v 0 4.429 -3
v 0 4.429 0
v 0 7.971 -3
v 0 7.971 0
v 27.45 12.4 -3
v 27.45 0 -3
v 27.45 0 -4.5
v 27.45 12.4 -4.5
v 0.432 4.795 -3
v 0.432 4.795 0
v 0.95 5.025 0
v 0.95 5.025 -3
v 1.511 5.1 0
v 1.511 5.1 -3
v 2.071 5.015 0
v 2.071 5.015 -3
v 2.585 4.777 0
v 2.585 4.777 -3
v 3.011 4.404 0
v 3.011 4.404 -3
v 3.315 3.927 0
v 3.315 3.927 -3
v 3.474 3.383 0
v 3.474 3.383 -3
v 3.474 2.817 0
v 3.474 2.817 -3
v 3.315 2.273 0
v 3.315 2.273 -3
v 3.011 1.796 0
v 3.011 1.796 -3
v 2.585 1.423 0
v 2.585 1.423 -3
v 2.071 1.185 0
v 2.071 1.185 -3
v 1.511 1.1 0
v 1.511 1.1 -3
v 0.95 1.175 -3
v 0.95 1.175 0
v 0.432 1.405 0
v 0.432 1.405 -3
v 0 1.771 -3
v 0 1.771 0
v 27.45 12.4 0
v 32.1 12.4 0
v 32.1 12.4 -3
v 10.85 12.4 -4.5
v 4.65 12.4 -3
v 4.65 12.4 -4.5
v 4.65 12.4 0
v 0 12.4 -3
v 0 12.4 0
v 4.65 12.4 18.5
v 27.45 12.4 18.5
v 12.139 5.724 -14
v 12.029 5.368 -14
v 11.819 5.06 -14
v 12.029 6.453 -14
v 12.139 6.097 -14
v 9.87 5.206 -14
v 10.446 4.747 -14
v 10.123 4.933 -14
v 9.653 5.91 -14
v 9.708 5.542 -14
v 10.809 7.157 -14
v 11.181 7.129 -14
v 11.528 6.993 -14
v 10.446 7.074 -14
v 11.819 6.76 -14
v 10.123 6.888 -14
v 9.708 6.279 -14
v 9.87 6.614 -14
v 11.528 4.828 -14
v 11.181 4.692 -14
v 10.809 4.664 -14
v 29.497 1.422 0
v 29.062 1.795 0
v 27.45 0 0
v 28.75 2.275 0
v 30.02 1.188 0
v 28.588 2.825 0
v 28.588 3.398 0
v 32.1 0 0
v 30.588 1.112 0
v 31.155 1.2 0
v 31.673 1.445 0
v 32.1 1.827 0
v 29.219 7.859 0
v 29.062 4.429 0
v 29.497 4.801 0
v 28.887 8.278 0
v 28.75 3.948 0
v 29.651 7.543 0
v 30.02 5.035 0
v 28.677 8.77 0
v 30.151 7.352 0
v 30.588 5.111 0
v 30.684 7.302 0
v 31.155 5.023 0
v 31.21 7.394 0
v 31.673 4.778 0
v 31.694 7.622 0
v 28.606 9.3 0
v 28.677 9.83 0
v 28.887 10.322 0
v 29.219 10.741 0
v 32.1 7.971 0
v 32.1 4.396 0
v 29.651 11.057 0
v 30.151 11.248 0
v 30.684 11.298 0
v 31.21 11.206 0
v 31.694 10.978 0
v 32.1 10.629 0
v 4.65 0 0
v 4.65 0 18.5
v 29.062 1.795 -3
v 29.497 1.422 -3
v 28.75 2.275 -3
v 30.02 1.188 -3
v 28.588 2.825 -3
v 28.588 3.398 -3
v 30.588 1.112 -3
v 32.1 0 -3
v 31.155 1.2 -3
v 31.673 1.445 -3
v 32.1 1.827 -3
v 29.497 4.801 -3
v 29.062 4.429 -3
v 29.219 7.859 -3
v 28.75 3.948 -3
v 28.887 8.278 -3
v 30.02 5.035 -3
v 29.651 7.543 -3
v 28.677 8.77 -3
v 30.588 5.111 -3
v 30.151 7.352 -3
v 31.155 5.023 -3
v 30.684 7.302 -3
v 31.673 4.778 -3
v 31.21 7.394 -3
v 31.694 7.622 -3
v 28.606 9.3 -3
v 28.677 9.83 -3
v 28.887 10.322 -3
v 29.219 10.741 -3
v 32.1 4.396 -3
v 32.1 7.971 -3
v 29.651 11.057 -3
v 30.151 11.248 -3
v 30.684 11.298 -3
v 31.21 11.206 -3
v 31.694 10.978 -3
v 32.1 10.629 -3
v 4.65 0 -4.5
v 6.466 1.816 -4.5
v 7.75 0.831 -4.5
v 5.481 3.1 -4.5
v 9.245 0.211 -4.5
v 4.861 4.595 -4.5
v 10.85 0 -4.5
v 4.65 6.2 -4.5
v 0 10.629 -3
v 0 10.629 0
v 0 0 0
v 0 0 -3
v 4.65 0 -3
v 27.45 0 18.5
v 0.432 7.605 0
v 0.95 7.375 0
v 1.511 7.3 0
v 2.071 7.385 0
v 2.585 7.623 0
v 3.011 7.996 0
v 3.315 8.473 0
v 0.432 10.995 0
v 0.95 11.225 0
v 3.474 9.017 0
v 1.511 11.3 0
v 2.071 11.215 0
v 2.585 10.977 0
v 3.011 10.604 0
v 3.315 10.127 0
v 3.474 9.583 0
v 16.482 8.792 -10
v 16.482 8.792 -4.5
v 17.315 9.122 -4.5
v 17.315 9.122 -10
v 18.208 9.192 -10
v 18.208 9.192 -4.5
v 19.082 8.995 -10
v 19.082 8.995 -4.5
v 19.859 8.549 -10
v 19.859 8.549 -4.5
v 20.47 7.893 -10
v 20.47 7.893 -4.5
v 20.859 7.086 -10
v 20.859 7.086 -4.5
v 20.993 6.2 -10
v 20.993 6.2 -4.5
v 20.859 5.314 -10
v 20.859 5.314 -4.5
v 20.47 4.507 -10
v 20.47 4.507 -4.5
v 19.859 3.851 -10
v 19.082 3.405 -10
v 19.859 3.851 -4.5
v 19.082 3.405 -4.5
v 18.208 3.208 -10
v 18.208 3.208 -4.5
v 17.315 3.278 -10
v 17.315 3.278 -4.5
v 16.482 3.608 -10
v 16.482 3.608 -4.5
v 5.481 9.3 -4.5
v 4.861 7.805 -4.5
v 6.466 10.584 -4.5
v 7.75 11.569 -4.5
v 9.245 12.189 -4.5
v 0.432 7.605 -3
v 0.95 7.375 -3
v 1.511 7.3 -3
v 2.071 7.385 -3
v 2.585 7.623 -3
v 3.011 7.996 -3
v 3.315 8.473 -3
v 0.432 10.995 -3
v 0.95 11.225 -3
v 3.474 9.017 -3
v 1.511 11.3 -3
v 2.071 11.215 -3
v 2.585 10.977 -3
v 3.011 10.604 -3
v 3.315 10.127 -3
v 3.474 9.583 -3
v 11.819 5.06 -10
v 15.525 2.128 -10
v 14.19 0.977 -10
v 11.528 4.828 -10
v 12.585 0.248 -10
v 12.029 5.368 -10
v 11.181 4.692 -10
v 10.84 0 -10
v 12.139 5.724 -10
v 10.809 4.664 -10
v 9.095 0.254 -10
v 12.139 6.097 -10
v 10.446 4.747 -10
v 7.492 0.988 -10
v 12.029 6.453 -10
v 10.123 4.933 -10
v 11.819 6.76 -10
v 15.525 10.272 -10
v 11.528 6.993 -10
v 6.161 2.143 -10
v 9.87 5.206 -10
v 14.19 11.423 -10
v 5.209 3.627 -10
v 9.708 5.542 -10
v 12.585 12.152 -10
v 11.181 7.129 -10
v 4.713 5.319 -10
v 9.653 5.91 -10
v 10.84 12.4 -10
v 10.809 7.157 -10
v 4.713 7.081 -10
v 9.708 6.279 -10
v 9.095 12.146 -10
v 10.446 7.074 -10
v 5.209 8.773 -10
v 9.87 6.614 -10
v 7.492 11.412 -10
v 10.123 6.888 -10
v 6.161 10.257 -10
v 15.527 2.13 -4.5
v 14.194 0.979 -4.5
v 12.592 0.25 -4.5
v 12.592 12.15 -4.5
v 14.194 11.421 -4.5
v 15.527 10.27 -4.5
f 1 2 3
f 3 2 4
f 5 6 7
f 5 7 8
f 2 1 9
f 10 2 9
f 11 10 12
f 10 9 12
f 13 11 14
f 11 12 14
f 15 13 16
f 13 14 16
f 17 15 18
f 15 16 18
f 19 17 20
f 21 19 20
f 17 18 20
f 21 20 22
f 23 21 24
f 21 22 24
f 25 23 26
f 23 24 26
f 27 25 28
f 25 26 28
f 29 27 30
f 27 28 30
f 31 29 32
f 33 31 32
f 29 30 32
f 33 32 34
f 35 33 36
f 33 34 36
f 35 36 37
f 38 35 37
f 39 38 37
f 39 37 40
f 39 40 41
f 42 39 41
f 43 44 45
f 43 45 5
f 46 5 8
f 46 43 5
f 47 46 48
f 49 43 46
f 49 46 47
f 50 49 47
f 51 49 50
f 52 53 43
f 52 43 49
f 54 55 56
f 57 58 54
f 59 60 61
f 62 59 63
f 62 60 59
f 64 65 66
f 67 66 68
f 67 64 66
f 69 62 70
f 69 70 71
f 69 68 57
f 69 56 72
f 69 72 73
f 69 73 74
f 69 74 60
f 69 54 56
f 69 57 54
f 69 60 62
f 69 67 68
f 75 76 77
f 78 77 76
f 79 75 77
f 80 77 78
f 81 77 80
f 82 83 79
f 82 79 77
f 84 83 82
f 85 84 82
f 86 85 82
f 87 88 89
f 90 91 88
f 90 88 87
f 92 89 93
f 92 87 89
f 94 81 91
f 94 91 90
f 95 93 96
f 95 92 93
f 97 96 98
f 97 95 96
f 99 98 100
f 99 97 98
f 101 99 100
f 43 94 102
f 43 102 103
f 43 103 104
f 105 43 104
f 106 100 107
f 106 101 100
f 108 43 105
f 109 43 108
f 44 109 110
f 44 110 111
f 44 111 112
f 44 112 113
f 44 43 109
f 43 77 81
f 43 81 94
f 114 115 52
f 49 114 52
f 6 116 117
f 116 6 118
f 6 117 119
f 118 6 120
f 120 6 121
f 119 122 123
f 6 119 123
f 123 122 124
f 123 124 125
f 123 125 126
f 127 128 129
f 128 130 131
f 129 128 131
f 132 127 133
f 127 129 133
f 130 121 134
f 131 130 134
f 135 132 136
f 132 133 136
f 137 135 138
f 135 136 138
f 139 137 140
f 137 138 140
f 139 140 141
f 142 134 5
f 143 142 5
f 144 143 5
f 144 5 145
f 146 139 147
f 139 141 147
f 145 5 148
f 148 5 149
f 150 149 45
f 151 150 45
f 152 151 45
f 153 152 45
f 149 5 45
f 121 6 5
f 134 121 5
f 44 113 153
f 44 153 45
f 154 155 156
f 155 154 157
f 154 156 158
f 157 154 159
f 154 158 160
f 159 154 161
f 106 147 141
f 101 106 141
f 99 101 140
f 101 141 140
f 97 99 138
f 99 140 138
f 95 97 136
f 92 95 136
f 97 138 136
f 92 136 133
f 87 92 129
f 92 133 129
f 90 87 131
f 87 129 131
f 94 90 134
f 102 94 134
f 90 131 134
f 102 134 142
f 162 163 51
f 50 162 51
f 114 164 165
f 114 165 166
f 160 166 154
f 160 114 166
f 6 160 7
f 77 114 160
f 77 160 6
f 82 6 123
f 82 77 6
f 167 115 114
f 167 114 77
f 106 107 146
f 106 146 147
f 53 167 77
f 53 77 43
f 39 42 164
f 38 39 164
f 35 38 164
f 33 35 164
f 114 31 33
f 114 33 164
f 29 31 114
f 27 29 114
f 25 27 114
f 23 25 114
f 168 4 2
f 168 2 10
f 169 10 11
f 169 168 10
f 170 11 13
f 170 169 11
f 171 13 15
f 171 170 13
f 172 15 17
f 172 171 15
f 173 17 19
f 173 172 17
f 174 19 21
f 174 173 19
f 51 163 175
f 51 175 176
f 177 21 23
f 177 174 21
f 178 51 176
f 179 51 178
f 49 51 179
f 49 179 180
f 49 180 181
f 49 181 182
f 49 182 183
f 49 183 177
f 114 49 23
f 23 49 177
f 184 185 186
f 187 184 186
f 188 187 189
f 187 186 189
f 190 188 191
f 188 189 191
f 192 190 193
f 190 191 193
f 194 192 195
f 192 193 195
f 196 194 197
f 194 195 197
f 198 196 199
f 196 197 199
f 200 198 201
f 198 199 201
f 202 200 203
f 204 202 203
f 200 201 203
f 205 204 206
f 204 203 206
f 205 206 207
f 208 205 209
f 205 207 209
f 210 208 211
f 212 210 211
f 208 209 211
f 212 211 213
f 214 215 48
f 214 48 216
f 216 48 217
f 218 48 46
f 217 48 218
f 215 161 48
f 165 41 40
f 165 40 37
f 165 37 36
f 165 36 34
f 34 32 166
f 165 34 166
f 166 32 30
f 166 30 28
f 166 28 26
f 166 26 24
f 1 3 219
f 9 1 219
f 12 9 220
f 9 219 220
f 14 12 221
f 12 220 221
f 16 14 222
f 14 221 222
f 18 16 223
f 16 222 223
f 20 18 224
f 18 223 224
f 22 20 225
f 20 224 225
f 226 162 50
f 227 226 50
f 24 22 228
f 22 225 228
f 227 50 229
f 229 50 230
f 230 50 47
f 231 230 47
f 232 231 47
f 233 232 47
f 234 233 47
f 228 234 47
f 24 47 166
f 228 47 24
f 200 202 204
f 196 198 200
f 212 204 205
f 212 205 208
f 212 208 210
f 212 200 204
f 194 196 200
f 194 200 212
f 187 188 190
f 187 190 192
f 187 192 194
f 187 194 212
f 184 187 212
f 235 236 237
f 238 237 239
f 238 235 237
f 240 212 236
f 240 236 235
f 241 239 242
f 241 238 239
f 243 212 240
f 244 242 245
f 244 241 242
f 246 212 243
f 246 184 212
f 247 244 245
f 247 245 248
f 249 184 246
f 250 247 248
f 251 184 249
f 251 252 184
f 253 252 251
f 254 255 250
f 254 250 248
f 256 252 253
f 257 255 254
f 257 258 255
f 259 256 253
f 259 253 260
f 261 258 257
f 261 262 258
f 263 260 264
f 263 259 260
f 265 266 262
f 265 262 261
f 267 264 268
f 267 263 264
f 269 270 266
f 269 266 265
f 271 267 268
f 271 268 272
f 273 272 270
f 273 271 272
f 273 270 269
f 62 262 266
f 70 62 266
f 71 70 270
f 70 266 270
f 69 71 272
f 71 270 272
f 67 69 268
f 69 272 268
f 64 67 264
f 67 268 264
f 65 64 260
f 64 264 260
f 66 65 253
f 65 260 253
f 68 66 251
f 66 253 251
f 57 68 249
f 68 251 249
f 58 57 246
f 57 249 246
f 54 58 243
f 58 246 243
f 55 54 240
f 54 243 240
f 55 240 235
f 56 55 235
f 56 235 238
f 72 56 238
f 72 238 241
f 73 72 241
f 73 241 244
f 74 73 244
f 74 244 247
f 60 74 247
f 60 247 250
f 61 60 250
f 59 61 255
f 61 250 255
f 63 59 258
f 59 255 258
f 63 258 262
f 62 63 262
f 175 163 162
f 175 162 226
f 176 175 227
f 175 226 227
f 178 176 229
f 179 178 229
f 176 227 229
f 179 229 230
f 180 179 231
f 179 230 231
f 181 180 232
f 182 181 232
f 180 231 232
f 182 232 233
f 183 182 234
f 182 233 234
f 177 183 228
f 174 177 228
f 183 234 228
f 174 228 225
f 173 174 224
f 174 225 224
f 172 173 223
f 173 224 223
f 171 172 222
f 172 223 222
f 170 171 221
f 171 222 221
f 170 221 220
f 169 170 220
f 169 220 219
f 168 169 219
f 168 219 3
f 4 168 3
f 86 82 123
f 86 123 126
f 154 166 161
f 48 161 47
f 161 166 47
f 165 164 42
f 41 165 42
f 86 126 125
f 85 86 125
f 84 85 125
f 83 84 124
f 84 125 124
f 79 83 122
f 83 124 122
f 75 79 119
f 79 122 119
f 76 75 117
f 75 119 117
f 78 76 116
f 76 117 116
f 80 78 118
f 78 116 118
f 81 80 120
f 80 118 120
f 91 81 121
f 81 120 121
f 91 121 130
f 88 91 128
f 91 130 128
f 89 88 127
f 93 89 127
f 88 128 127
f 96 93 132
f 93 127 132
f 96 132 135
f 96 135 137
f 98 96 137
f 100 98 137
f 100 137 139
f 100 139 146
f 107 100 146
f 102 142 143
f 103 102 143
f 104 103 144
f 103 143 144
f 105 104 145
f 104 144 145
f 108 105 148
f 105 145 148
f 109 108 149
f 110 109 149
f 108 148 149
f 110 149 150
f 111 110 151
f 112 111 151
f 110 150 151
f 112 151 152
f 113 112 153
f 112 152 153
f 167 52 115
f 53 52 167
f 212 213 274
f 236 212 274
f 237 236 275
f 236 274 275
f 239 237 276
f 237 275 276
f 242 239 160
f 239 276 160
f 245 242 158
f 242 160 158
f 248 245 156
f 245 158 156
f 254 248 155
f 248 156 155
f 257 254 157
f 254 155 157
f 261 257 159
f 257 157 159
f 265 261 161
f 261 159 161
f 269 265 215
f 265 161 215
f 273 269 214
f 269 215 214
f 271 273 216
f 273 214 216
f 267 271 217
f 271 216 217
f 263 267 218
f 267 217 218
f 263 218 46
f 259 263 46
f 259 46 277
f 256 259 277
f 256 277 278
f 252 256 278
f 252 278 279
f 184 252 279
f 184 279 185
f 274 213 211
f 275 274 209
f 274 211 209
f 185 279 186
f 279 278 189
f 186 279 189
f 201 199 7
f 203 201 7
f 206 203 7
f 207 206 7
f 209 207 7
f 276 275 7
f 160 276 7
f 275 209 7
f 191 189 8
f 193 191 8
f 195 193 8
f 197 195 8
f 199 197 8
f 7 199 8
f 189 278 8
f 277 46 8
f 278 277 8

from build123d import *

# Parameters (mm, degrees)
SKETCH1_W             = 11.4
SKETCH1_H             = 12.4
BOSS_EXTRUDE1_DEPTH   = 18.5
SKETCH1_4_W           = 4.65
SKETCH1_4_H           = 12.4
BOSS_EXTRUDE2_DEPTH   = 2.5
BOSS_EXTRUDE2_2_DEPTH = 2.5
SKETCH1_11_W          = 4.65
SKETCH1_11_H          = 12.4
BOSS_EXTRUDE8_DEPTH   = 3
SKETCH1_13_W          = 11.4
SKETCH1_13_H          = 12.4
BOSS_EXTRUDE9_DEPTH   = 4.5
BOSS_EXTRUDE11_DEPTH  = 5.5
SKETCH10_R            = 1.25
BOSS_EXTRUDE12_DEPTH  = 4
BOSS_EXTRUDE13_DEPTH  = 5
SKETCH15_R            = 2
CUT_EXTRUDE1_DEPTH    = 3


with BuildPart() as part:
    # Sketch1 → Boss-Extrude1 (new body)
    with BuildSketch(Plane.XY):
        with Locations((10.35, 6.2)):
            Rectangle(SKETCH1_W, SKETCH1_H)
        with Locations((21.75, 6.2)):
            Rectangle(SKETCH1_W, SKETCH1_H)
    extrude(amount=BOSS_EXTRUDE1_DEPTH)



with BuildPart() as body_2:
    # Sketch1<4> → Boss-Extrude2 (new body)
    with BuildSketch(Plane.XY):
        with Locations((2.325, 6.2)):
            Rectangle(SKETCH1_4_W, SKETCH1_4_H)
    extrude(amount=-BOSS_EXTRUDE2_DEPTH)



with BuildPart() as body_3:
    # Sketch1<4> → Boss-Extrude2 2 (new body)
    with BuildSketch(Plane.XY):
        with Locations((29.775, 6.2)):
            Rectangle(SKETCH1_4_W, SKETCH1_4_H)
    extrude(amount=-BOSS_EXTRUDE2_2_DEPTH)


with BuildPart() as body_2_1:
    add(body_2.part)

    add(body_3.part)  # Boss-Extrude8 merges body 3
    # Sketch1<11> → Boss-Extrude8 (add)
    with BuildSketch(Plane.XY):
        with Locations((29.775, 6.2)):
            Rectangle(SKETCH1_11_W, SKETCH1_11_H)
        with Locations((2.325, 6.2)):
            Rectangle(SKETCH1_11_W, SKETCH1_11_H)
    extrude(amount=-BOSS_EXTRUDE8_DEPTH)


with BuildPart() as part_1:
    add(part.part)

    add(body_2_1.part)  # Boss-Extrude9 merges body 2
    # Sketch1<13> → Boss-Extrude9 (add)
    with BuildSketch(Plane.XY):
        with Locations((21.75, 6.2)):
            Rectangle(SKETCH1_13_W, SKETCH1_13_H)
        with Locations((10.35, 6.2)):
            Rectangle(SKETCH1_13_W, SKETCH1_13_H)
    extrude(amount=-BOSS_EXTRUDE9_DEPTH)

    # Sketch8 → Boss-Extrude11 (add)
    with BuildSketch(Plane(origin=(0, 0, -4.5), x_dir=(-1, 0, 0), z_dir=(0, 0, -1))):
        with BuildLine():
            ThreePointArc((-16.482252321, 3.608140862), (-4.65, 6.2), (-16.482252321, 8.791859138))
            ThreePointArc((-16.482252321, 8.791859138), (-20.992969439, 6.2), (-16.482252321, 3.608140862))
        make_face()
    extrude(amount=BOSS_EXTRUDE11_DEPTH)

    # Sketch10 → Boss-Extrude12 (add)
    with BuildSketch(Plane(origin=(0, 0, -10), x_dir=(-1, 0, 0), z_dir=(0, 0, -1))):
        with Locations((-10.902835345, 5.910258943)):
            Circle(SKETCH10_R)
    extrude(amount=BOSS_EXTRUDE12_DEPTH)

    # Sketch8<2> → Boss-Extrude13 (add)
    with BuildSketch(Plane(origin=(0, 0, -4.5), x_dir=(-1, 0, 0), z_dir=(0, 0, -1))):
        with BuildLine():
            ThreePointArc((-16.482252321, 3.608140862), (-4.65, 6.2), (-16.482252321, 8.791859138))
            ThreePointArc((-16.482252321, 8.791859138), (-20.992969439, 6.2), (-16.482252321, 3.608140862))
        make_face()
    extrude(amount=BOSS_EXTRUDE13_DEPTH)

    # Sketch15 → Cut-Extrude1 (cut)
    with BuildSketch(Plane(origin=(0, 0, -3), x_dir=(-1, 0, 0), z_dir=(0, 0, -1))):
        with BuildLine():
            ThreePointArc((-32.1, 10.629307241), (-32.605696731, 9.3), (-32.1, 7.970692759))
            Line((-32.1, 7.970692759), (-32.1, 10.629307241))
        make_face()
        with BuildLine():
            Line((-32.1, 10.629307241), (-32.1, 7.970692759))
            ThreePointArc((-32.1, 7.970692759), (-29.894573162, 7.430694442), (-28.605696731, 9.3))
            ThreePointArc((-28.605696731, 9.3), (-29.894573162, 11.169305558), (-32.1, 10.629307241))
        make_face()
        with Locations((-1.494303269, 9.3)):
            Circle(SKETCH15_R)
        with BuildLine():
            ThreePointArc((0, 4.429307241), (-3.494303269, 3.1), (0, 1.770692759))
            Line((0, 1.770692759), (0, 4.429307241))
        make_face()
        with BuildLine():
            Line((0, 4.429307241), (0, 1.770692759))
            ThreePointArc((0, 1.770692759), (0.375002289, 2.38887643), (0.505696731, 3.1))
            ThreePointArc((0.505696731, 3.1), (0.375002289, 3.81112357), (0, 4.429307241))
        make_face()
        with Locations((-30.567157508, 3.111527569)):
            Circle(SKETCH15_R)
    extrude(amount=-CUT_EXTRUDE1_DEPTH, mode=Mode.SUBTRACT)


solid = part_1.part
